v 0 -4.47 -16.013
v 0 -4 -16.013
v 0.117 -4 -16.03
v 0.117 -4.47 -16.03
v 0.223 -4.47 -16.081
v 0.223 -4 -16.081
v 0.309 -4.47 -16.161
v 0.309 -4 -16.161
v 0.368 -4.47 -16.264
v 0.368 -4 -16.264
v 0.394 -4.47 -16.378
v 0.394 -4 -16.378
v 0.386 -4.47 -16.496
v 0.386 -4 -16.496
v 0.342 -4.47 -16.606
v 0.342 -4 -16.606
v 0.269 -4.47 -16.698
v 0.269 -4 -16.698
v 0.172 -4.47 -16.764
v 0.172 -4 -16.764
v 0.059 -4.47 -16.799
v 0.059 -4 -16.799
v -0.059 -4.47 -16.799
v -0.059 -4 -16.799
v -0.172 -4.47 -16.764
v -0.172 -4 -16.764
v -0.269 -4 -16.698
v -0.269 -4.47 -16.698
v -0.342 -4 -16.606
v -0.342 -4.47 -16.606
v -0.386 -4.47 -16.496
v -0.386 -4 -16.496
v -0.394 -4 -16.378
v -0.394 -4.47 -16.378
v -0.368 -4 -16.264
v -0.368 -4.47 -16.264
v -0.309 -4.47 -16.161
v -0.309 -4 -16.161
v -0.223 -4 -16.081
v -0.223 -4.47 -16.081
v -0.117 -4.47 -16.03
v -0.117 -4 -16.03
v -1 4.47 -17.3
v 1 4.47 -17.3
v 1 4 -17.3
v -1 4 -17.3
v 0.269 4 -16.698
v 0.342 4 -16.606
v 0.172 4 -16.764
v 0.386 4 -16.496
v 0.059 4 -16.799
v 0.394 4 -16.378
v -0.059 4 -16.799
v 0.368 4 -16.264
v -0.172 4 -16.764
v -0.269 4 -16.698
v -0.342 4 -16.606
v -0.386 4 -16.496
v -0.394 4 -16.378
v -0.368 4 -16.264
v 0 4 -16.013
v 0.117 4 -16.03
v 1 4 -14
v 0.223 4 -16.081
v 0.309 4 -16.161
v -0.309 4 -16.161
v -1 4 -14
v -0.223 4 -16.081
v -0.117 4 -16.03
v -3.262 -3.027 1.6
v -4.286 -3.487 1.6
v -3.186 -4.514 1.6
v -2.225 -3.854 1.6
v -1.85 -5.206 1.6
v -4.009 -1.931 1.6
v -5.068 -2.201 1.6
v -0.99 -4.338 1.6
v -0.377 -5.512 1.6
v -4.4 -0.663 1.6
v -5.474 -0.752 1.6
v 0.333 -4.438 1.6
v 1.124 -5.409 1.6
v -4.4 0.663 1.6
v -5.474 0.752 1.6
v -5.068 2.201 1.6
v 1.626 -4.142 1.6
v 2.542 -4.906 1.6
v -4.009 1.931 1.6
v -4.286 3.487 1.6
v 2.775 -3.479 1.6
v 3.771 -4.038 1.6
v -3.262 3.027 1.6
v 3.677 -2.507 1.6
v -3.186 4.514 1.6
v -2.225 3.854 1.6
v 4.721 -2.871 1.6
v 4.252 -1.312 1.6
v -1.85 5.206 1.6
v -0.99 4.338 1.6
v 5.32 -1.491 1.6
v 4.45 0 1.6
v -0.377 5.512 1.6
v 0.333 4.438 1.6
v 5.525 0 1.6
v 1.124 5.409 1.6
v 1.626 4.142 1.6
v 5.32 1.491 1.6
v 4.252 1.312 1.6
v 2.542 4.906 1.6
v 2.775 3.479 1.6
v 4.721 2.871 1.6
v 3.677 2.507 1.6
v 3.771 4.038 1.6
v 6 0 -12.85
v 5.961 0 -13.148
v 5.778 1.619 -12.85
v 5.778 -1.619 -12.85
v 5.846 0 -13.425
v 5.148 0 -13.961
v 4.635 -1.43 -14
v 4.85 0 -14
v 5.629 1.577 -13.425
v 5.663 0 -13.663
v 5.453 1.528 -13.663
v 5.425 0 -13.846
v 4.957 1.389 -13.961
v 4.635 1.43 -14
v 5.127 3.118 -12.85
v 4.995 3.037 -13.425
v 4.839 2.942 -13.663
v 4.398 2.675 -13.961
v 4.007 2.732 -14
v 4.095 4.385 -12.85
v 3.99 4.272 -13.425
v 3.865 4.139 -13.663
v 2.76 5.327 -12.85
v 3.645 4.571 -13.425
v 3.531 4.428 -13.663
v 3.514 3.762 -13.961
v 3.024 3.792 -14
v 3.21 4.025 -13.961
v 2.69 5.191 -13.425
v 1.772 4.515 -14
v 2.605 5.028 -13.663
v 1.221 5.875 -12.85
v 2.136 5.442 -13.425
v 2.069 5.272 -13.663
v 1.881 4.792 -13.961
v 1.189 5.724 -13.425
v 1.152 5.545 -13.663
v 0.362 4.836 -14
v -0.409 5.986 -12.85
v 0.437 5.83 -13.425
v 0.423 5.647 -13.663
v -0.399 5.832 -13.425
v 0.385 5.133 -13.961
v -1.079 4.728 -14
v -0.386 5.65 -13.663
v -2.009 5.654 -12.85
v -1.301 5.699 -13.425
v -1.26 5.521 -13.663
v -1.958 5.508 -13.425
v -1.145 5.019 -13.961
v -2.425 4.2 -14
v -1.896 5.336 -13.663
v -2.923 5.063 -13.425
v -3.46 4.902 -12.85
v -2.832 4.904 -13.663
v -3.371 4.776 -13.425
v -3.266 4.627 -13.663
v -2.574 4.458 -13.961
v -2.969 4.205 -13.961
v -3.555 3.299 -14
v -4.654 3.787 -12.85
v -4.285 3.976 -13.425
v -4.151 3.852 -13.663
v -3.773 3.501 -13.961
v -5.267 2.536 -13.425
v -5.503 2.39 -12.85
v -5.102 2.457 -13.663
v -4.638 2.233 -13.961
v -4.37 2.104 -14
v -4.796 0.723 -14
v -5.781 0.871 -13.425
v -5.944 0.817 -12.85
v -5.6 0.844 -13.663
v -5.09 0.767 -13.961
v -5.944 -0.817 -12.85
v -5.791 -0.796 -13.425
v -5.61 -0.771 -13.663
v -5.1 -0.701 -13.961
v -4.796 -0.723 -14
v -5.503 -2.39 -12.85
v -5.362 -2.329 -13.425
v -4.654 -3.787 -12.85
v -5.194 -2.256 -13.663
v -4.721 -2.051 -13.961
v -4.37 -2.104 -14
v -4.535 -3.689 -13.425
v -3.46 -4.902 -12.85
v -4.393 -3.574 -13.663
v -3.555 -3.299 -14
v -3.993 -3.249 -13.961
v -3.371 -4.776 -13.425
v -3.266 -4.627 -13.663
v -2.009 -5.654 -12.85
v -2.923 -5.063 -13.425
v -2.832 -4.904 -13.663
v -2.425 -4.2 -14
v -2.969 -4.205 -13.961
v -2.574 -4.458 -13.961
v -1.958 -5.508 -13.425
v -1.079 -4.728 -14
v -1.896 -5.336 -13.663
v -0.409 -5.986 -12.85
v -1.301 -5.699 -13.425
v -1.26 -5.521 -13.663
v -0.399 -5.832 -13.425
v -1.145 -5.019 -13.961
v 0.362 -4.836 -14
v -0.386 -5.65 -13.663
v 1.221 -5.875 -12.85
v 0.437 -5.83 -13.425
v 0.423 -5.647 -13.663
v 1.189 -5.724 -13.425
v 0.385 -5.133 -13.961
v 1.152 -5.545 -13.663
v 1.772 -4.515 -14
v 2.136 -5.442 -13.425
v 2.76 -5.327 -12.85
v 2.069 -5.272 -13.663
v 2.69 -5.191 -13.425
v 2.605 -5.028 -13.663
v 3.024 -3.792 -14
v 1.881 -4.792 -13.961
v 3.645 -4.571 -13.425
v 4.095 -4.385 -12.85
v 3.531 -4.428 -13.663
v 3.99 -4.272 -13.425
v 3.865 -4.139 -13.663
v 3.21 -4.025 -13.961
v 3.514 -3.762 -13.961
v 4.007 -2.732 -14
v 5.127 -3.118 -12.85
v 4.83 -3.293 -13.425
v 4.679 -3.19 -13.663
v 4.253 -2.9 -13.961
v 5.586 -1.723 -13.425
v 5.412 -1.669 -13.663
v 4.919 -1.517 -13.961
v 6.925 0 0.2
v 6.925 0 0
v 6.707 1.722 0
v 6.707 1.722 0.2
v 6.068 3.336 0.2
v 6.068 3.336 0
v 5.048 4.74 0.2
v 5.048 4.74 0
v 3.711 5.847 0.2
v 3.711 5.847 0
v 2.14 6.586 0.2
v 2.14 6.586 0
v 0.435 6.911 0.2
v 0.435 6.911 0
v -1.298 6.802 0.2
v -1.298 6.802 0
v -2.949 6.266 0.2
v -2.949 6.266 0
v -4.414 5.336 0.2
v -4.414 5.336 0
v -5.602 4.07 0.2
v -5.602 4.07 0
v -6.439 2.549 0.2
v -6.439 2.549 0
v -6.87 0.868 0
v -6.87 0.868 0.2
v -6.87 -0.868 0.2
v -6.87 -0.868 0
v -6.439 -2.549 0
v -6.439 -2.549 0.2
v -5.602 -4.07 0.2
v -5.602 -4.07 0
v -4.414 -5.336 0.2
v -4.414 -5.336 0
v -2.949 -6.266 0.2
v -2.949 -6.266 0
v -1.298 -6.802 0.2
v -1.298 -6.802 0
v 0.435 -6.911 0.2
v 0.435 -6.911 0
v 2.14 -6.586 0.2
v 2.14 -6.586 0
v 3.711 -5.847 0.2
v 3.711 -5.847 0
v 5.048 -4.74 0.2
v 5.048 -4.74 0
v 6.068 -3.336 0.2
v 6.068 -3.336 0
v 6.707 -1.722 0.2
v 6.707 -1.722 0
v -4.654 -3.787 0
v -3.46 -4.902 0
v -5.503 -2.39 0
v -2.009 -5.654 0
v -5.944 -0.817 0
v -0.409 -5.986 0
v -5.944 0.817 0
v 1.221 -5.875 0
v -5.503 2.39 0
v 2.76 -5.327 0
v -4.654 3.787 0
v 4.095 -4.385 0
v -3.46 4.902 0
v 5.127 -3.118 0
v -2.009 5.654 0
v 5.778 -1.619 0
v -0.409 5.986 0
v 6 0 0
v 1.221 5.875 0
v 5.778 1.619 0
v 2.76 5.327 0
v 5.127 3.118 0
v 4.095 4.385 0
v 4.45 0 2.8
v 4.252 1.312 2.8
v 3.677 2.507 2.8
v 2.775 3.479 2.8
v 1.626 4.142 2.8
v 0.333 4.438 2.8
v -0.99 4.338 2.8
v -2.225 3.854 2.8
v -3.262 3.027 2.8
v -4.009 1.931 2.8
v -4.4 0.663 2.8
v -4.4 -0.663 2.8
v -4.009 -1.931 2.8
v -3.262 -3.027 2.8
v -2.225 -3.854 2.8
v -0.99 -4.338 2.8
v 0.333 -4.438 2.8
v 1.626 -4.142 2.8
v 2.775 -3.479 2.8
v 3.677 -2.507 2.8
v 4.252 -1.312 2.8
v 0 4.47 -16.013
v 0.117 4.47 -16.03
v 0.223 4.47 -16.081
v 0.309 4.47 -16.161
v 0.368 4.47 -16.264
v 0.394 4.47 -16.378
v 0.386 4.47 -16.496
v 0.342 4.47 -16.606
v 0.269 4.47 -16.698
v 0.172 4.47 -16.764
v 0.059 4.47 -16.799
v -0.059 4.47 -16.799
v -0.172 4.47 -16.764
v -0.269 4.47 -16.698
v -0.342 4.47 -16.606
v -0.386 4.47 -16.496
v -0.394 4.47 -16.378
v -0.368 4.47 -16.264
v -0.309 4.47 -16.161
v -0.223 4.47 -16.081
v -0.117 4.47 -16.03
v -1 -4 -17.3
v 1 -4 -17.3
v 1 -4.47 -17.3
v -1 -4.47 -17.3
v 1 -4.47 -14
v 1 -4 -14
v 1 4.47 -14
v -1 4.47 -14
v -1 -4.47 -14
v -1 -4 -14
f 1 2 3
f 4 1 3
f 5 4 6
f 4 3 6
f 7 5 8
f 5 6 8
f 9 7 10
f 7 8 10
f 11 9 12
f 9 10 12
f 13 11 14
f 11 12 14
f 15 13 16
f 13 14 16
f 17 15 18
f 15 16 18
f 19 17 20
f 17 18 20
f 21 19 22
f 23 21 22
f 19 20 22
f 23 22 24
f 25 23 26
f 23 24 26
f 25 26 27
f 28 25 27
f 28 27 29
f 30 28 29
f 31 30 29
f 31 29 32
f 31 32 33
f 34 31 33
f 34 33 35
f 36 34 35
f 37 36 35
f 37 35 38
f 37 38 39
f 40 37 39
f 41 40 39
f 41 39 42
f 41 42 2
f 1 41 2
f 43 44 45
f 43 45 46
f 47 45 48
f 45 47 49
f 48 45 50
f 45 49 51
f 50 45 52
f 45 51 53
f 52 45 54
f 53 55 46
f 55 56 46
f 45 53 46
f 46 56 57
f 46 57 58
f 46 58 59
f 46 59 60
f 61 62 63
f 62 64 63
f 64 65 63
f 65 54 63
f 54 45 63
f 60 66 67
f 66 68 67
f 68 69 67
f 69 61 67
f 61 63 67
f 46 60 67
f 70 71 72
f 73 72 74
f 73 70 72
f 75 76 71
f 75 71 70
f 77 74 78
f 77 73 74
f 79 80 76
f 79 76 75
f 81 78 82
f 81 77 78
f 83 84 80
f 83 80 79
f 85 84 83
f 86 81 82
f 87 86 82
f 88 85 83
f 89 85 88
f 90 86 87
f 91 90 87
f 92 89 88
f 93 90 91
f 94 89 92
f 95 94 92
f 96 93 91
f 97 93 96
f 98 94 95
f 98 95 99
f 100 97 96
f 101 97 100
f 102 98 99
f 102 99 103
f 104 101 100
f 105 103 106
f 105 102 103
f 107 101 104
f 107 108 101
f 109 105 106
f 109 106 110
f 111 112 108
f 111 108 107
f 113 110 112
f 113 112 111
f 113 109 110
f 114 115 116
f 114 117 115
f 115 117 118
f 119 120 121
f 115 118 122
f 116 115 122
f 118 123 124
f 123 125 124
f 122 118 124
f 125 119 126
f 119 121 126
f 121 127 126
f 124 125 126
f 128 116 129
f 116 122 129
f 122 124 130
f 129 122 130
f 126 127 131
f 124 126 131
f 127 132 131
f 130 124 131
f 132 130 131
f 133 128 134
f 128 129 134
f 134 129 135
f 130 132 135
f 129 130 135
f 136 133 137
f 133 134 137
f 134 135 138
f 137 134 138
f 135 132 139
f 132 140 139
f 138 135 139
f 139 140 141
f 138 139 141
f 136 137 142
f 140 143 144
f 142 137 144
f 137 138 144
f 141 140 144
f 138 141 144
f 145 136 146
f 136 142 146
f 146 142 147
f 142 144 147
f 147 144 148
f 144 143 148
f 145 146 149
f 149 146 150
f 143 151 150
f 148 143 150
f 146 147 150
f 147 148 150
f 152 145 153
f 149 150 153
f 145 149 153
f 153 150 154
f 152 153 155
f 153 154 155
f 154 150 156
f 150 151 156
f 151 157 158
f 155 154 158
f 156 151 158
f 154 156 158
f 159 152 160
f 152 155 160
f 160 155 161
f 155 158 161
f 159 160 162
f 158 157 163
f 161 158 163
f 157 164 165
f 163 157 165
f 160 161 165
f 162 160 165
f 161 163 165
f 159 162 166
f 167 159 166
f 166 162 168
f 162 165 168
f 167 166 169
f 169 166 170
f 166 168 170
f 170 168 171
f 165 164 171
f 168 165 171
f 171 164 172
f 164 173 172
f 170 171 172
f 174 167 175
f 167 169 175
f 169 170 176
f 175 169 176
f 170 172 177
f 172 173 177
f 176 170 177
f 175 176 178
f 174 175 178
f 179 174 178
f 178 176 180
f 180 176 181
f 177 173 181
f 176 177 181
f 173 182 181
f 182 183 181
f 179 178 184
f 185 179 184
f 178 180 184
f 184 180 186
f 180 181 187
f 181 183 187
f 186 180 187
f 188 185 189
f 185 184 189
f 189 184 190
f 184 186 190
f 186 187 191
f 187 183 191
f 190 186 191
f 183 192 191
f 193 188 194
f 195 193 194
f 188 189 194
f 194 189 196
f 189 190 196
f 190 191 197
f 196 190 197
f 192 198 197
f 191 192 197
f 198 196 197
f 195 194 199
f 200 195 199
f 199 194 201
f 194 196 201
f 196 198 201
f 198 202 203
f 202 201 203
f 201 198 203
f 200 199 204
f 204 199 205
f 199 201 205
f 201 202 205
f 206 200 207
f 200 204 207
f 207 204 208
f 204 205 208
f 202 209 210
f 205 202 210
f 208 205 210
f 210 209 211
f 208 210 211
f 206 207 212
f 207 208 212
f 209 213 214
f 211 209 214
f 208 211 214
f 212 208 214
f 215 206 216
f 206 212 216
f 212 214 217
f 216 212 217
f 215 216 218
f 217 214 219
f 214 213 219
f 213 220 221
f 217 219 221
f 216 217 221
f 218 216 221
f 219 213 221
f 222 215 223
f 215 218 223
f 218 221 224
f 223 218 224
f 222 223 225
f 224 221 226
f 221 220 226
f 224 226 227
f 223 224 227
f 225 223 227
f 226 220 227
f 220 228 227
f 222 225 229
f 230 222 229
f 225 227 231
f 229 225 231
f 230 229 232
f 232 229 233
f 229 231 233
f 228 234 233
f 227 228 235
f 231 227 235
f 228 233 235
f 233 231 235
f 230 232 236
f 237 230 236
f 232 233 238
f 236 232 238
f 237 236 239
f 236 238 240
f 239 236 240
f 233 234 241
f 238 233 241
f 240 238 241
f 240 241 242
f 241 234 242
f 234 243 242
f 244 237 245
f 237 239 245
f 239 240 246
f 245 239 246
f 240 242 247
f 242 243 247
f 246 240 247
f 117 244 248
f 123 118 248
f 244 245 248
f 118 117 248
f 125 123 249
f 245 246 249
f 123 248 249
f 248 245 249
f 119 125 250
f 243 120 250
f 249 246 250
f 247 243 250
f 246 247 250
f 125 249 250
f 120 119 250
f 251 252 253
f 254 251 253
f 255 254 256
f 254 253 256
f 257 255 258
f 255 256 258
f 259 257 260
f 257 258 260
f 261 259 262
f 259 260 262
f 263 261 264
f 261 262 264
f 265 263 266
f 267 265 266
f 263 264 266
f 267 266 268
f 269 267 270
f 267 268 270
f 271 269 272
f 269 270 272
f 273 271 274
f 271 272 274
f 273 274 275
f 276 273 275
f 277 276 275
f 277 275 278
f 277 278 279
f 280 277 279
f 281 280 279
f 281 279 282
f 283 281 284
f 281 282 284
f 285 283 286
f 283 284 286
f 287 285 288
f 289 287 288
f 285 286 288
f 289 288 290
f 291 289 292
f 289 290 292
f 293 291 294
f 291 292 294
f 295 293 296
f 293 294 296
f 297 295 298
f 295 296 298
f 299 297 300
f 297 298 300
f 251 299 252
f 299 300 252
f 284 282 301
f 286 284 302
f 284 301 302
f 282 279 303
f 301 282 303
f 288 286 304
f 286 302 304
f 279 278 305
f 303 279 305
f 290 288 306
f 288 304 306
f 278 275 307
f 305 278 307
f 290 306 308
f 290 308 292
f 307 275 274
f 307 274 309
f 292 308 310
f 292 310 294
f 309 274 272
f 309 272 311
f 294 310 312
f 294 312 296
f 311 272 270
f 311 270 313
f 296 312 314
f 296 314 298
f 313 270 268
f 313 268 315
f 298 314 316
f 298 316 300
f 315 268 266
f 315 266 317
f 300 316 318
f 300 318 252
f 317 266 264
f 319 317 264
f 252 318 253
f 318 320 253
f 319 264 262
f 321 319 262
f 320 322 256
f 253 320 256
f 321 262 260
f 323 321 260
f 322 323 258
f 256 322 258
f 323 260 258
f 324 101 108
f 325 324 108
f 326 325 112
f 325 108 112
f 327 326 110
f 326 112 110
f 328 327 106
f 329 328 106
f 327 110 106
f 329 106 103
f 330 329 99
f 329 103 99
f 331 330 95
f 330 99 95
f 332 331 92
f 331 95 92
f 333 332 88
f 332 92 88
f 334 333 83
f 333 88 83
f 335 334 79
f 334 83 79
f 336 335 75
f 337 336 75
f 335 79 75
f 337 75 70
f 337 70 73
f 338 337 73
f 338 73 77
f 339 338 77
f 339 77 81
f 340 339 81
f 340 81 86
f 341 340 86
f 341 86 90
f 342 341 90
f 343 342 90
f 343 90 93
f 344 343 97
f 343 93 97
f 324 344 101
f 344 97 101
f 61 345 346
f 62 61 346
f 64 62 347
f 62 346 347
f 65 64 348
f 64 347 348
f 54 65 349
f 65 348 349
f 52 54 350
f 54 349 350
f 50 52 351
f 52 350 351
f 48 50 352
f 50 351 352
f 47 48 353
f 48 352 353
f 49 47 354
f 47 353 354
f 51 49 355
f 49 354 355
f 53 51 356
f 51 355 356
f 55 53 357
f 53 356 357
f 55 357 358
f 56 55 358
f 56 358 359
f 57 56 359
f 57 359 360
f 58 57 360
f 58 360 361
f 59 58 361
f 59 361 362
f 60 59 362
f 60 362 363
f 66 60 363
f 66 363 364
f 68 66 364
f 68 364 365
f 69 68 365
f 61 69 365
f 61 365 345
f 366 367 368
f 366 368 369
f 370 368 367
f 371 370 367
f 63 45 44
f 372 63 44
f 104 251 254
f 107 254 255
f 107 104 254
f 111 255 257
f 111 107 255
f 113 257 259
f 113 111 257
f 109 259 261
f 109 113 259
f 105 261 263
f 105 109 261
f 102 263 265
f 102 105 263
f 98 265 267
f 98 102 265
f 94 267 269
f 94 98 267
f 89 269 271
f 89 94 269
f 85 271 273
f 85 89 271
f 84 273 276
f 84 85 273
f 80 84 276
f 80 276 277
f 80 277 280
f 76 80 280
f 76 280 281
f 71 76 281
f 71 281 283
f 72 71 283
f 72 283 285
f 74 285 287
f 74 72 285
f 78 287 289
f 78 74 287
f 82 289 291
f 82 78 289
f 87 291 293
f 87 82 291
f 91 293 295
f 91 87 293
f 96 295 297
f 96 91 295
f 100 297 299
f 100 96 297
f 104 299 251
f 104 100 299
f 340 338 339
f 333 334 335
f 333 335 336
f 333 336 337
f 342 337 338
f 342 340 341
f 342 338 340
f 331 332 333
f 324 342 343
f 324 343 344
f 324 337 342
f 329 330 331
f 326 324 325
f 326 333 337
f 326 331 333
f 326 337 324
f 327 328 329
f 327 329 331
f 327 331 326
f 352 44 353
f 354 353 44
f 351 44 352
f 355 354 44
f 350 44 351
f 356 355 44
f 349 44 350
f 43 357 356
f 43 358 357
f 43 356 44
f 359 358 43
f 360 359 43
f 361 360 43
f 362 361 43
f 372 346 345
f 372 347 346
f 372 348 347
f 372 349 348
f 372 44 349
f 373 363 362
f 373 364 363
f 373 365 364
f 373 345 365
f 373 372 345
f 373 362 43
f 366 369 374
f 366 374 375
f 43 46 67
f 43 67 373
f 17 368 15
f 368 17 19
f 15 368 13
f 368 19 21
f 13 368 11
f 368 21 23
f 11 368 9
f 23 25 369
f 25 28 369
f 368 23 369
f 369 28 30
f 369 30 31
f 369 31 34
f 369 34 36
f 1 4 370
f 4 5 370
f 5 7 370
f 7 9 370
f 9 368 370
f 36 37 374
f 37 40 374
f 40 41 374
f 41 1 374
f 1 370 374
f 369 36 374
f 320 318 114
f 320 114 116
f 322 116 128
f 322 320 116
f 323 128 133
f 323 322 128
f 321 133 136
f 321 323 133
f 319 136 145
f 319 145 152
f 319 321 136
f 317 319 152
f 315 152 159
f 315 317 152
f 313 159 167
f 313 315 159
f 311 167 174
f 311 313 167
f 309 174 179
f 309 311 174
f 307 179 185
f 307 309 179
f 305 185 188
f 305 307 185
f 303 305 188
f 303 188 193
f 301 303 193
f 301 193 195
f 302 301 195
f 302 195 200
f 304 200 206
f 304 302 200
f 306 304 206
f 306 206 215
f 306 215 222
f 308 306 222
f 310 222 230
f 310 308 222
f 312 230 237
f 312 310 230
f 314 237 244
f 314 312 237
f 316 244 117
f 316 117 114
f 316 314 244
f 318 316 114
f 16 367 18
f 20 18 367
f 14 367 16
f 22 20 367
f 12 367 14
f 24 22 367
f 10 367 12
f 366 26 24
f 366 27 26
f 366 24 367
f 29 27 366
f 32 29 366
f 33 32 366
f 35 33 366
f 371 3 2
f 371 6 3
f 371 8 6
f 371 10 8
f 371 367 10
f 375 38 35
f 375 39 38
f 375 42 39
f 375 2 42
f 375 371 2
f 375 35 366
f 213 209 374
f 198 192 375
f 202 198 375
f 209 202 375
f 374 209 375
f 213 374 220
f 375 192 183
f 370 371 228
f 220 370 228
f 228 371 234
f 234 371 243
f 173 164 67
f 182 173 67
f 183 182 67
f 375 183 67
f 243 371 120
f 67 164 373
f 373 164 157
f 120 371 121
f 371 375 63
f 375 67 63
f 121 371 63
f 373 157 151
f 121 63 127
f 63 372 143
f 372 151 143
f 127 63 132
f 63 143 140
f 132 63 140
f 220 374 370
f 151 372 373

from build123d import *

# Parameters (mm, degrees)
SKETCH1_R           = 6
BOSS_EXTRUDE1_DEPTH = 14
SKETCH2_R           = 6.925
BOSS_EXTRUDE2_DEPTH = 1.6
CHAMFER1_SIZE       = 1.4
SKETCH3_R           = 4.45
BOSS_EXTRUDE3_DEPTH = 1.2
FILLET1_R           = 1.15
SKETCH5_W           = 2
SKETCH5_H           = 0.47
BOSS_EXTRUDE4_DEPTH = 3.3
SKETCH6_R           = 0.395429062
CUT_EXTRUDE1_DEPTH  = 22.84242775


with BuildPart() as part:
    # Sketch1 → Boss-Extrude1 (new body)
    with BuildSketch(Plane.XY):
        Circle(SKETCH1_R)
    extrude(amount=-BOSS_EXTRUDE1_DEPTH)

    # Sketch2 → Boss-Extrude2 (add)
    with BuildSketch(Plane.XY):
        Circle(SKETCH2_R)
    extrude(amount=BOSS_EXTRUDE2_DEPTH)

    # Chamfer1
    chamfer1_edges = [part.edges().sort_by_distance(p)[0] for p in [
        (-6.925, 0, 1.6),
    ]]
    chamfer(chamfer1_edges, length=CHAMFER1_SIZE)

    # Sketch3 → Boss-Extrude3 (add)
    with BuildSketch(Plane.XY.offset(1.6)):
        Circle(SKETCH3_R)
    extrude(amount=BOSS_EXTRUDE3_DEPTH)

    # Fillet1
    fillet1_edges = [part.edges().sort_by_distance(p)[0] for p in [
        (-6, 0, -14),
    ]]
    fillet(fillet1_edges, radius=FILLET1_R)

    # Sketch5 → Boss-Extrude4 (add)
    with BuildSketch(Plane(origin=(0, 0, -14), x_dir=(-1, 0, 0), z_dir=(0, 0, -1))):
        with Locations((0, -4.235)):
            Rectangle(SKETCH5_W, SKETCH5_H)
        with Locations((0, 4.235)):
            Rectangle(SKETCH5_W, SKETCH5_H)
    extrude(amount=BOSS_EXTRUDE4_DEPTH)

    # Sketch6 → Cut-Extrude1 (cut, through all)
    with BuildSketch(Plane(origin=(0, 4.47, 0), x_dir=(1, 0, 0), z_dir=(0, 1, 0))):
        with Locations(Location((0, 16.408005075, 0), (0, 0, 270))):
            Circle(SKETCH6_R)
    extrude(amount=-CUT_EXTRUDE1_DEPTH, mode=Mode.SUBTRACT)


solid = part.part
